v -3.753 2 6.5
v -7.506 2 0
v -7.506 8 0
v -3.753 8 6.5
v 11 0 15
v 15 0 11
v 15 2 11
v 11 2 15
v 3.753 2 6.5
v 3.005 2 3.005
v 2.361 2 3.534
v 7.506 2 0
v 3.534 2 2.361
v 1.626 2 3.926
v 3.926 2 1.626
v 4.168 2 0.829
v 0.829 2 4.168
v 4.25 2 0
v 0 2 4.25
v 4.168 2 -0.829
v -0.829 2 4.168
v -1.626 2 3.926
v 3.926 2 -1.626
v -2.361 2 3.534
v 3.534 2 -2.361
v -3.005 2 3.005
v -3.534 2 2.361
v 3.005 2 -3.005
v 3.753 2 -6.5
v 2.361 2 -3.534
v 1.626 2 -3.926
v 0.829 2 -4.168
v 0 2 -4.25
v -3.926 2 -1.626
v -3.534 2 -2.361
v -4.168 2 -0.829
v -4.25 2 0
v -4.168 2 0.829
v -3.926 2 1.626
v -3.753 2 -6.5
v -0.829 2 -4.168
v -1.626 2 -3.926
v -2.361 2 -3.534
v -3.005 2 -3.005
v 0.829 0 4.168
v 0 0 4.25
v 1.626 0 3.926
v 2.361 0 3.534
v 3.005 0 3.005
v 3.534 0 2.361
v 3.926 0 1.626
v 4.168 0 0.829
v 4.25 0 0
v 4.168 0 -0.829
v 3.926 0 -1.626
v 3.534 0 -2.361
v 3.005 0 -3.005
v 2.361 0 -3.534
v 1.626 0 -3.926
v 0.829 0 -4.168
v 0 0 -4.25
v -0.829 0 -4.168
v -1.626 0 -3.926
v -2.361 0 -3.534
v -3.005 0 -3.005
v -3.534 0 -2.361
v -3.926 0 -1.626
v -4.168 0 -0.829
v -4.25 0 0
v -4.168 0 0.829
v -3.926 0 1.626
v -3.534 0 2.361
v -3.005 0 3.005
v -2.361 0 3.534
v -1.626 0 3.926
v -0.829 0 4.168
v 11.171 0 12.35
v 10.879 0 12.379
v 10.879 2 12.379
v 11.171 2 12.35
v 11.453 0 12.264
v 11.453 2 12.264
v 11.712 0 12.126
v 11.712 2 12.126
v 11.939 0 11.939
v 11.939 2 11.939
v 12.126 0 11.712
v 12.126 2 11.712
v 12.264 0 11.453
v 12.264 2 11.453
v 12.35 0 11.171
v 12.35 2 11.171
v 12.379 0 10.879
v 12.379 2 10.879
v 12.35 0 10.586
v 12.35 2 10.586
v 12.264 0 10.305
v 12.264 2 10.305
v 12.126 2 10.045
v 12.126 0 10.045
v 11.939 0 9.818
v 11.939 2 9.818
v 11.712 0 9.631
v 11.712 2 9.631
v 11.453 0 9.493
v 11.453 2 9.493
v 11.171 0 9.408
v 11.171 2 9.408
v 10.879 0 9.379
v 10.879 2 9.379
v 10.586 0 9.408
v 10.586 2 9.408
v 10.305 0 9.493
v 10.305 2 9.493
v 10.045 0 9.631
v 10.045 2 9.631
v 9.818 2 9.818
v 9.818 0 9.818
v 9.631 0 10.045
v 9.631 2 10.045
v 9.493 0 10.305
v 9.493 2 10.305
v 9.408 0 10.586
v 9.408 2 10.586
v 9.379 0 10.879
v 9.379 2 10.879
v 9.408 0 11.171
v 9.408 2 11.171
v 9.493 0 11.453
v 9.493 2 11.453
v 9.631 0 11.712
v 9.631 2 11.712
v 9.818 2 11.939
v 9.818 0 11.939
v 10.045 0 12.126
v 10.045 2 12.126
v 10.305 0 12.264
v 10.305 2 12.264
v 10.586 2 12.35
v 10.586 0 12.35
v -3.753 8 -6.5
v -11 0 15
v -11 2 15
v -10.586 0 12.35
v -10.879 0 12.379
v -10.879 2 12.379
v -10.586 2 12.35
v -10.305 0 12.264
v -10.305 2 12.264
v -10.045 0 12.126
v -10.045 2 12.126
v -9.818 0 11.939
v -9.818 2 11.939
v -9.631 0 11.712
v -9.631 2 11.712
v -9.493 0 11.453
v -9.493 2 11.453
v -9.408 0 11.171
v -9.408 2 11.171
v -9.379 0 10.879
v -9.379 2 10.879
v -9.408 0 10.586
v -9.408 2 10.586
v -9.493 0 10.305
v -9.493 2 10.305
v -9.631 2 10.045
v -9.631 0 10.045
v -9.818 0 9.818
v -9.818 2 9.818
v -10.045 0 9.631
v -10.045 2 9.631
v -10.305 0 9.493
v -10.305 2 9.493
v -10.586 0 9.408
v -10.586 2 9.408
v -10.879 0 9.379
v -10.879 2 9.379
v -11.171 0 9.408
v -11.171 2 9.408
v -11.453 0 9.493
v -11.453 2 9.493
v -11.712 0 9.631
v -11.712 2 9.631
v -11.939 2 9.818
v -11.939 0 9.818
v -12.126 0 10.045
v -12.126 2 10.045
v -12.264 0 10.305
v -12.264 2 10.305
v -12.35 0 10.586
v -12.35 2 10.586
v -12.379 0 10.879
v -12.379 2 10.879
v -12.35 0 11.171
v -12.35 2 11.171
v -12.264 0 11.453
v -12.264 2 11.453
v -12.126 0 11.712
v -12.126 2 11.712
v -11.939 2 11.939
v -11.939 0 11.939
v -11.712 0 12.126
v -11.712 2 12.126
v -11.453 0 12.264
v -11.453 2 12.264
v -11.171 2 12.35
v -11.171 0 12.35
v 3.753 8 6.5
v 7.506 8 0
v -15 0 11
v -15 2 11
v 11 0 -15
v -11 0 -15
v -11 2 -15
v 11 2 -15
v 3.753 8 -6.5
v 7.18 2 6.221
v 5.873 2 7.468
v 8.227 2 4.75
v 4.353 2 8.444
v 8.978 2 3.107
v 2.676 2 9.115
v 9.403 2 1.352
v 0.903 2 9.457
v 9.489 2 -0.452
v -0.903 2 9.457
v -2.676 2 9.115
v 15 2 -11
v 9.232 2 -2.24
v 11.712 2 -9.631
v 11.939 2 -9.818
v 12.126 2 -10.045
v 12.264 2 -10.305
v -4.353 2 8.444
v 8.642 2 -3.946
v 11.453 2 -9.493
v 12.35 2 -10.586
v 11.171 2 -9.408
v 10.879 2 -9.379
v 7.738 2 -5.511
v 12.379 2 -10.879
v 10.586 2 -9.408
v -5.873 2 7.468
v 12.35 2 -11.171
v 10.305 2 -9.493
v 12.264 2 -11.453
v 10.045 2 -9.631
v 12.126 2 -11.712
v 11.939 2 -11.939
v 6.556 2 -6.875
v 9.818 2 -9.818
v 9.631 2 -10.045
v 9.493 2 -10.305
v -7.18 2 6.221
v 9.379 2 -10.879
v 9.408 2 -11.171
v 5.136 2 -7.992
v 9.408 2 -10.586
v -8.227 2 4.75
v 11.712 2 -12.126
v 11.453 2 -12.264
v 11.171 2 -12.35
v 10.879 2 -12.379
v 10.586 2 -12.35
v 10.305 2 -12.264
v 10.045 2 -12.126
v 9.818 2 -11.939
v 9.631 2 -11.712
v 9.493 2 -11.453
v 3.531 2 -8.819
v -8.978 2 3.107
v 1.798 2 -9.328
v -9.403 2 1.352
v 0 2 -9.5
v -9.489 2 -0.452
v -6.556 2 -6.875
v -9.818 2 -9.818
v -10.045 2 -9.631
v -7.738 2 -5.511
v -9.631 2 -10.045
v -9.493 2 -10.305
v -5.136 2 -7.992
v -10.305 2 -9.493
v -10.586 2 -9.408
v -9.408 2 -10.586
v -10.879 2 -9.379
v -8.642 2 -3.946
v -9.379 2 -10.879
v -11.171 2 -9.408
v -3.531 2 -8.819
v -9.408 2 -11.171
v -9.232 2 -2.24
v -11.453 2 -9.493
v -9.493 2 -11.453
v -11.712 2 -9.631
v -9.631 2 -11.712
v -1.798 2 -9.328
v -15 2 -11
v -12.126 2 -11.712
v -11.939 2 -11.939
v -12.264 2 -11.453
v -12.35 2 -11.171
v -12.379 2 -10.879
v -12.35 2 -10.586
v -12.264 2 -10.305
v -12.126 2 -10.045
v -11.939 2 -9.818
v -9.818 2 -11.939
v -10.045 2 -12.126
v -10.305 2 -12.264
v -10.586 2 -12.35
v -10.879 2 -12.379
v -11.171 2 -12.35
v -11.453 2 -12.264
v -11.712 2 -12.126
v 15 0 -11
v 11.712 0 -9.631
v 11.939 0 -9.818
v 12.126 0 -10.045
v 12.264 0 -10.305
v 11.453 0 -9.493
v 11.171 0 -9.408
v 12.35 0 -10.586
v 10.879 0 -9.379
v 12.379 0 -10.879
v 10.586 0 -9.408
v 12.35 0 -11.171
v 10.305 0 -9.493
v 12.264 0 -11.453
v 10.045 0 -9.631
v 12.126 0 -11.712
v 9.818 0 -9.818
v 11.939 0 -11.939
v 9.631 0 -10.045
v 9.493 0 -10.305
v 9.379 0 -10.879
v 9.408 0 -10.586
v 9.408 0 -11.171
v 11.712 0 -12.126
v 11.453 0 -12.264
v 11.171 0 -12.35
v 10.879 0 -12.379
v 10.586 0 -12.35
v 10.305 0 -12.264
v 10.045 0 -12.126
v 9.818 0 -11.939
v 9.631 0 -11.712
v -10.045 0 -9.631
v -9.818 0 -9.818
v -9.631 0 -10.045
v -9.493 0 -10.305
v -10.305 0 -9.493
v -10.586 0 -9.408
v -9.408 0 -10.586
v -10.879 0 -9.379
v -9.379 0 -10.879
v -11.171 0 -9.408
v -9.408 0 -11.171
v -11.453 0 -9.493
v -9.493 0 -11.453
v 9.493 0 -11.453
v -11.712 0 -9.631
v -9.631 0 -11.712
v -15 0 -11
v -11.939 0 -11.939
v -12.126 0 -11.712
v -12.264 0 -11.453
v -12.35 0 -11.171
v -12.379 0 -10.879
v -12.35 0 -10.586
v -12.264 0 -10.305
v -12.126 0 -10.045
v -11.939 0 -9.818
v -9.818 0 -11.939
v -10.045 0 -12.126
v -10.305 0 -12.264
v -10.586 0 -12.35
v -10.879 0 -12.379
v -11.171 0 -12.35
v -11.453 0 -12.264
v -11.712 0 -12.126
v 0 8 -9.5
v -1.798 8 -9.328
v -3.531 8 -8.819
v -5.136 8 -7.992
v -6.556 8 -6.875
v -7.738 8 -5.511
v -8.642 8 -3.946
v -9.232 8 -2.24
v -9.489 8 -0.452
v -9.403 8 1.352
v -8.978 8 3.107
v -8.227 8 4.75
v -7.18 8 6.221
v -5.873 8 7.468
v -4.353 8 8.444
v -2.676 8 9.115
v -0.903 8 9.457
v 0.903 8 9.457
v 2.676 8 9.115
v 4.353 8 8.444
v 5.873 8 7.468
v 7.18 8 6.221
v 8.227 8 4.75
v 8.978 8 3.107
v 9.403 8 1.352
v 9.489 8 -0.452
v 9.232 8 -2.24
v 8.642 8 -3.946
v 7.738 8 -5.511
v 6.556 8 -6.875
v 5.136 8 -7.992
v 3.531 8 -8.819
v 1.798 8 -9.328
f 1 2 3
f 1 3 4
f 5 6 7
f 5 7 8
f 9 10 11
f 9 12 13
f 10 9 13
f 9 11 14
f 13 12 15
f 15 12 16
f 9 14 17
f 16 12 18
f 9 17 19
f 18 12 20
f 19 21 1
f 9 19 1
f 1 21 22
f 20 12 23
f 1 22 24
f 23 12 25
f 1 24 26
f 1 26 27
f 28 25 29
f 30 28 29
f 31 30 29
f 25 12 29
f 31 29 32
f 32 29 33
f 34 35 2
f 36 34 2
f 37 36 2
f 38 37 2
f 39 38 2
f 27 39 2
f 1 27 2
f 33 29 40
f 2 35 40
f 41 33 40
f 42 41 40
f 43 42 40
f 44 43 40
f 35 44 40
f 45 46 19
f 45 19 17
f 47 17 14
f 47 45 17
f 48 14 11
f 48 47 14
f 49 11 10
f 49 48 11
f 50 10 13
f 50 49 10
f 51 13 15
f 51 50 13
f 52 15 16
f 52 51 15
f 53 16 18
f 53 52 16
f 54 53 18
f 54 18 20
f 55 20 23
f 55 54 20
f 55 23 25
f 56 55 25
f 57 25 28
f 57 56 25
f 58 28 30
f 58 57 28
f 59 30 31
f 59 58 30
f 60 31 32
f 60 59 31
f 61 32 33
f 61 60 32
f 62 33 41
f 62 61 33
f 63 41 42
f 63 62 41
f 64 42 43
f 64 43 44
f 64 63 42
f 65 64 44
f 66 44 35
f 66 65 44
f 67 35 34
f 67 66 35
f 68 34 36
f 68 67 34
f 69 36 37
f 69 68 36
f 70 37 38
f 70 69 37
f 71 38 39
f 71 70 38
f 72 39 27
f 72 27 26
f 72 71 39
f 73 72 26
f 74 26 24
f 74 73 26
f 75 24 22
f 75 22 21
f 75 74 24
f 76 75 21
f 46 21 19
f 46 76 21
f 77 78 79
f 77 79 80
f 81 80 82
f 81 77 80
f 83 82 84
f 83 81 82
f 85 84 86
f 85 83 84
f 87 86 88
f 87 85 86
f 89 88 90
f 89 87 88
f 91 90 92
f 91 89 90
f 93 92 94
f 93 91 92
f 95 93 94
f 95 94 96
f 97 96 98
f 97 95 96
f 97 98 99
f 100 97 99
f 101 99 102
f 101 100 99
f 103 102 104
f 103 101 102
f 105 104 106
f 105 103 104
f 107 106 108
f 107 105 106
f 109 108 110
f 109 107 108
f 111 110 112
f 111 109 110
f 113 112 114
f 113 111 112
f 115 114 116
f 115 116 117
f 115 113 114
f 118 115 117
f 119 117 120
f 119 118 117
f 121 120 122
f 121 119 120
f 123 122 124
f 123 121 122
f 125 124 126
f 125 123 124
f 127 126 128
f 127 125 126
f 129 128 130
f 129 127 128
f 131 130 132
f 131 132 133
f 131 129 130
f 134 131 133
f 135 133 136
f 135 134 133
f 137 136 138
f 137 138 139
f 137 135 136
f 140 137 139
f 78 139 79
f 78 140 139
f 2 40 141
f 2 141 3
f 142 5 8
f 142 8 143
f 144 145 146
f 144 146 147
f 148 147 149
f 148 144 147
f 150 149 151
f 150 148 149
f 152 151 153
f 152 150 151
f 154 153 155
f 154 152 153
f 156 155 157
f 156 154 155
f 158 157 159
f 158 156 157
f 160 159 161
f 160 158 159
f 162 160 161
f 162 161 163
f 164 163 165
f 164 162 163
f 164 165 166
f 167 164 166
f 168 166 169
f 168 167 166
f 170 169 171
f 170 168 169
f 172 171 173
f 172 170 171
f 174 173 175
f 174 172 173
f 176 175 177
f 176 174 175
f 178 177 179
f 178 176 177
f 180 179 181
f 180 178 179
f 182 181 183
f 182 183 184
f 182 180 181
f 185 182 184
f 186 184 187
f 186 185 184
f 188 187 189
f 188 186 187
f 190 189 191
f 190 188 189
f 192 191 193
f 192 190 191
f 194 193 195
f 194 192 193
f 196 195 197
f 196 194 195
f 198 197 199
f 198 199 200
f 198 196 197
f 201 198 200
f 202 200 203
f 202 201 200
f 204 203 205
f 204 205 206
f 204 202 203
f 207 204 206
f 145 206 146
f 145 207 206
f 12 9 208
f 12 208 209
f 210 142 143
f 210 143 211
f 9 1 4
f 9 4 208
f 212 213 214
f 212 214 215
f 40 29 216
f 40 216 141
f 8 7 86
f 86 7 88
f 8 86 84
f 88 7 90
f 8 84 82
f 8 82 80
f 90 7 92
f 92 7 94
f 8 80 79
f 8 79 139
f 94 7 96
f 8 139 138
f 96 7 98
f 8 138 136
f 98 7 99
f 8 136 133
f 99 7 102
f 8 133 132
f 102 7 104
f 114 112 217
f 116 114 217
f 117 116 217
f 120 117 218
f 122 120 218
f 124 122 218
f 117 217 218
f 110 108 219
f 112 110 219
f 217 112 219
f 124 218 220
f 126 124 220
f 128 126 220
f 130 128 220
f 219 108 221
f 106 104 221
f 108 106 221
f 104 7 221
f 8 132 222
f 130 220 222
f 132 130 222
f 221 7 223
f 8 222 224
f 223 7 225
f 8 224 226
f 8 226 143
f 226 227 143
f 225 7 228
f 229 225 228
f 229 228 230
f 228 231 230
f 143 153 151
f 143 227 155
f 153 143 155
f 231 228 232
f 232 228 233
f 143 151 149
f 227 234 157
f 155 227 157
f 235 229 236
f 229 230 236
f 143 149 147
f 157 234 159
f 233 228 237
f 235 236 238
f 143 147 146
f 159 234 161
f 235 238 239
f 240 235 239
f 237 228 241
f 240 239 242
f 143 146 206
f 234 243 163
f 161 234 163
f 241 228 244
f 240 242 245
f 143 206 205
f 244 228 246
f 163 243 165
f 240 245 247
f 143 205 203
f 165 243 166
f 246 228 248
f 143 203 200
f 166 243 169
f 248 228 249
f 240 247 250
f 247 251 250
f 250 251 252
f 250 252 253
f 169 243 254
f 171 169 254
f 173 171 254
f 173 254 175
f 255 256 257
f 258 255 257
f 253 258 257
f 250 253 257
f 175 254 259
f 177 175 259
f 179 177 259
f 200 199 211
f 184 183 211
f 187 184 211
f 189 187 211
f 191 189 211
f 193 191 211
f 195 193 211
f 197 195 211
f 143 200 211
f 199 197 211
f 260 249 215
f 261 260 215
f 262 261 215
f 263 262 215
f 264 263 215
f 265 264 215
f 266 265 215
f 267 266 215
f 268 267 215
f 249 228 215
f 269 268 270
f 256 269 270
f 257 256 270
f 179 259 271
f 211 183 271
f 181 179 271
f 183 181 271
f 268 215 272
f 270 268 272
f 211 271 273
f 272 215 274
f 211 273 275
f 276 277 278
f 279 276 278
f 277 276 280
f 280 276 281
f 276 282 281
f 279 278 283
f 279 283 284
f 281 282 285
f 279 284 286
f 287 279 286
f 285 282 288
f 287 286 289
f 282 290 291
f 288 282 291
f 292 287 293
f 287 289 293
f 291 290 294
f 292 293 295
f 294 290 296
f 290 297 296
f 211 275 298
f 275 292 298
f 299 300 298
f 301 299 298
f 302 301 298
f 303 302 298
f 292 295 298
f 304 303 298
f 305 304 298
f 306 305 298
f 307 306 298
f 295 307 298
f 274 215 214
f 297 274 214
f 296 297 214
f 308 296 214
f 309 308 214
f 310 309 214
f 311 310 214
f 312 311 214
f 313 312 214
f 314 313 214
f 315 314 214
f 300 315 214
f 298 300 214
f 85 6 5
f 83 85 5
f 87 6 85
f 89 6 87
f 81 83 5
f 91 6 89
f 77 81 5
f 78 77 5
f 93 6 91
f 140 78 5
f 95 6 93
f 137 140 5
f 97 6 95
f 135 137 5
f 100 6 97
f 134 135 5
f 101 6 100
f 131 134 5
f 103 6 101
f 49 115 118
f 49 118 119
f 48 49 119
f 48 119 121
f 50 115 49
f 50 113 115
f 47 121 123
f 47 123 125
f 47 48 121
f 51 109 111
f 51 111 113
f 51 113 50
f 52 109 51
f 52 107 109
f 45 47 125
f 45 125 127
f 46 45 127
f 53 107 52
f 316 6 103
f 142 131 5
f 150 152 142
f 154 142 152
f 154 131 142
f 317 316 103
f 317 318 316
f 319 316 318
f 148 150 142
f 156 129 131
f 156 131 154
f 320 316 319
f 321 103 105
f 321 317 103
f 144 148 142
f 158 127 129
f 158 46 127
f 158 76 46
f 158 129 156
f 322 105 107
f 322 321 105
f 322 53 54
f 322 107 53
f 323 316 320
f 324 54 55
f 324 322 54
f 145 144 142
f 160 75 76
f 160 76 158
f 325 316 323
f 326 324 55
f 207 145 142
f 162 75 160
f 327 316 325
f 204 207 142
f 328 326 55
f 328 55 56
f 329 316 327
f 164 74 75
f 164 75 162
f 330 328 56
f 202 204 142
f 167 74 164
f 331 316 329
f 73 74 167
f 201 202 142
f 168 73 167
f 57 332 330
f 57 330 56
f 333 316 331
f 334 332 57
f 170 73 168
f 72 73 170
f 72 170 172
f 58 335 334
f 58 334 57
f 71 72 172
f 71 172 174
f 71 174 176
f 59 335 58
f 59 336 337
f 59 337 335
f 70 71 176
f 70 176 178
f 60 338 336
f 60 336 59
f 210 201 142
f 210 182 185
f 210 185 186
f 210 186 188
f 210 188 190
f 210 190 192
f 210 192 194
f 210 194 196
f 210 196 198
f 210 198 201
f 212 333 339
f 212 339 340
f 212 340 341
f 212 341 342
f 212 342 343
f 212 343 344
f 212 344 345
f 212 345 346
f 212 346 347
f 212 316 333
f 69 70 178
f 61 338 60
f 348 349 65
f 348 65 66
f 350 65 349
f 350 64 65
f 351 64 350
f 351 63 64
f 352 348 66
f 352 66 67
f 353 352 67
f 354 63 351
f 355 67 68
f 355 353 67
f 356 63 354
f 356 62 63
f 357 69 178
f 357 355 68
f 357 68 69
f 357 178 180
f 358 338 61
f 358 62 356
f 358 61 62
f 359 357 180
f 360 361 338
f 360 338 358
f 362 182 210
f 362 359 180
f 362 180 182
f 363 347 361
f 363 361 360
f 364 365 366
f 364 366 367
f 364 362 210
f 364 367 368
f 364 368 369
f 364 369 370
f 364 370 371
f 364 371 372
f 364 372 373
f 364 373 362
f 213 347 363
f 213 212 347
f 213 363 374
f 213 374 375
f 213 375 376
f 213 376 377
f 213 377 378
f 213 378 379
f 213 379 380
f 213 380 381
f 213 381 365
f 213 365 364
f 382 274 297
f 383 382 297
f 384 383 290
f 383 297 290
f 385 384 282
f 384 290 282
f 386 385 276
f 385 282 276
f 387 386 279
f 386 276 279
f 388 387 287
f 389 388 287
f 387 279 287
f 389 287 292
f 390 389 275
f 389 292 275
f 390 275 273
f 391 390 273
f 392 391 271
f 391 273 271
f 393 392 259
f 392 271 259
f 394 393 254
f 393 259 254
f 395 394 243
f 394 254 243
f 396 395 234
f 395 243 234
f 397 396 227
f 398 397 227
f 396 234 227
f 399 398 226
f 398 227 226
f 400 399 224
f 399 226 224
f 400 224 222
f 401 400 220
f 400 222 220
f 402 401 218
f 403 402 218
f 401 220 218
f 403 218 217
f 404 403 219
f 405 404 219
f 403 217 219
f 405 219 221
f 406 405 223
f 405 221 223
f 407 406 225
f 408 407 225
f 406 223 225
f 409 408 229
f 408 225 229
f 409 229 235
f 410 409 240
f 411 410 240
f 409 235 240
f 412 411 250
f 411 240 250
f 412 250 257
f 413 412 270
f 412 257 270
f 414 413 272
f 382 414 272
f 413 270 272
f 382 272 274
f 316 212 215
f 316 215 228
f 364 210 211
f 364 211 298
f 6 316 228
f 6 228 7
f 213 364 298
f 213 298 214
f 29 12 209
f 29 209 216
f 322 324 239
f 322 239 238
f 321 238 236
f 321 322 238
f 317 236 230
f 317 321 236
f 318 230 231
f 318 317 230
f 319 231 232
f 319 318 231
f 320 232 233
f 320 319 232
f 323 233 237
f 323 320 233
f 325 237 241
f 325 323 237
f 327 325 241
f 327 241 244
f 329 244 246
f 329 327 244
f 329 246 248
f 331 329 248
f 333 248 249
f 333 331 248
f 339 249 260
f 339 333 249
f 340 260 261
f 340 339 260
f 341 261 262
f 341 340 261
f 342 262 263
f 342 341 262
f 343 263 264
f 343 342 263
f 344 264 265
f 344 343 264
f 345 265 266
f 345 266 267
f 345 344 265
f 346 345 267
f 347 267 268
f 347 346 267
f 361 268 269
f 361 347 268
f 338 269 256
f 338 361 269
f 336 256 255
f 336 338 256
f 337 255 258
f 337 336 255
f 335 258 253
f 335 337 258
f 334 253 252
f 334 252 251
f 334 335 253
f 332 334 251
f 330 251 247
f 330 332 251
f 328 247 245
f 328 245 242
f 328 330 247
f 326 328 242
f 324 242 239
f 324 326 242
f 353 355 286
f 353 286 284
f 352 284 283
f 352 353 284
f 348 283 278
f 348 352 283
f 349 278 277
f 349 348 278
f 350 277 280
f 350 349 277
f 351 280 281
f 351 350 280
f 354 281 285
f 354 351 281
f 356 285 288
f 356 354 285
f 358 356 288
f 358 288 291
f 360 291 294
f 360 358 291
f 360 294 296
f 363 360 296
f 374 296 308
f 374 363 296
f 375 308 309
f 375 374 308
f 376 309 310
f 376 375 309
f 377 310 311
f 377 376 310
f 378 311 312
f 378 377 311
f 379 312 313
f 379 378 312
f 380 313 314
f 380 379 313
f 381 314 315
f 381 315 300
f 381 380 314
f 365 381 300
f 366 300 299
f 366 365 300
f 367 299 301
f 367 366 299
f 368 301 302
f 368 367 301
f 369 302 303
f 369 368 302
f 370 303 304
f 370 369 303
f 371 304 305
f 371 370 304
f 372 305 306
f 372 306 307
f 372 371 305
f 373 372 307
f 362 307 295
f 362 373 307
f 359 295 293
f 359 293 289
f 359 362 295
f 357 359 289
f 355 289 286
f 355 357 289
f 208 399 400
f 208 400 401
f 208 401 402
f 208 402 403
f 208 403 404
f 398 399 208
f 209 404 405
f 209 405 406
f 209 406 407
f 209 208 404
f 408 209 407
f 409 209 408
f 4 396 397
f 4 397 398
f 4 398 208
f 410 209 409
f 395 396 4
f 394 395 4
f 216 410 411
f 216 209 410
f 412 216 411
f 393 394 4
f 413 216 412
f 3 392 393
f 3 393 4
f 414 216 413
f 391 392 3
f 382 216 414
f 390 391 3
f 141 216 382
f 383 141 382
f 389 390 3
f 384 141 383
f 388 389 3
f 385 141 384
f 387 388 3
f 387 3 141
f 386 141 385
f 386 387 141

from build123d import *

# Parameters (mm, degrees)
SKETCH1_R           = 4.25
SKETCH1_R_2         = 1.5
BOSS_EXTRUDE1_DEPTH = 2
SKETCH2_R           = 9.5
BOSS_EXTRUDE2_DEPTH = 6


with BuildPart() as part:
    # Sketch1 → Boss-Extrude1 (new body)
    with BuildSketch(Plane(origin=(0, 0, 0), x_dir=(1, 0, 0), z_dir=(0, 1, 0))):
        Polygon((-15, 11), (-11, 15), (11, 15), (15, 11), (15, -11), (11, -15), (-11, -15), (-15, -11), align=None)
        with Locations(Location((0, 0, 0), (0, 0, 270))):
            Circle(SKETCH1_R, mode=Mode.SUBTRACT)
        with Locations(Location((-10.878679656, -10.878679656, 0), (0, 0, 270))):
            Circle(SKETCH1_R_2, mode=Mode.SUBTRACT)
        with Locations(Location((-10.878679656, 10.878679656, 0), (0, 0, 270))):
            Circle(SKETCH1_R_2, mode=Mode.SUBTRACT)
        with Locations(Location((10.878679656, 10.878679656, 0), (0, 0, 270))):
            Circle(SKETCH1_R_2, mode=Mode.SUBTRACT)
        with Locations(Location((10.878679656, -10.878679656, 0), (0, 0, 270))):
            Circle(SKETCH1_R_2, mode=Mode.SUBTRACT)
    extrude(amount=BOSS_EXTRUDE1_DEPTH)

    # Sketch2 → Boss-Extrude2 (add)
    with BuildSketch(Plane(origin=(0, 2, 0), x_dir=(1, 0, 0), z_dir=(0, 1, 0))):
        with Locations(Location((0, 0, 0), (0, 0, 90))):
            Circle(SKETCH2_R)
        Polygon((7.505553499, 0), (3.75277675, 6.5), (-3.75277675, 6.5), (-7.505553499, 0), (-3.75277675, -6.5), (3.75277675, -6.5), align=None, mode=Mode.SUBTRACT)
    extrude(amount=BOSS_EXTRUDE2_DEPTH)


solid = part.part
